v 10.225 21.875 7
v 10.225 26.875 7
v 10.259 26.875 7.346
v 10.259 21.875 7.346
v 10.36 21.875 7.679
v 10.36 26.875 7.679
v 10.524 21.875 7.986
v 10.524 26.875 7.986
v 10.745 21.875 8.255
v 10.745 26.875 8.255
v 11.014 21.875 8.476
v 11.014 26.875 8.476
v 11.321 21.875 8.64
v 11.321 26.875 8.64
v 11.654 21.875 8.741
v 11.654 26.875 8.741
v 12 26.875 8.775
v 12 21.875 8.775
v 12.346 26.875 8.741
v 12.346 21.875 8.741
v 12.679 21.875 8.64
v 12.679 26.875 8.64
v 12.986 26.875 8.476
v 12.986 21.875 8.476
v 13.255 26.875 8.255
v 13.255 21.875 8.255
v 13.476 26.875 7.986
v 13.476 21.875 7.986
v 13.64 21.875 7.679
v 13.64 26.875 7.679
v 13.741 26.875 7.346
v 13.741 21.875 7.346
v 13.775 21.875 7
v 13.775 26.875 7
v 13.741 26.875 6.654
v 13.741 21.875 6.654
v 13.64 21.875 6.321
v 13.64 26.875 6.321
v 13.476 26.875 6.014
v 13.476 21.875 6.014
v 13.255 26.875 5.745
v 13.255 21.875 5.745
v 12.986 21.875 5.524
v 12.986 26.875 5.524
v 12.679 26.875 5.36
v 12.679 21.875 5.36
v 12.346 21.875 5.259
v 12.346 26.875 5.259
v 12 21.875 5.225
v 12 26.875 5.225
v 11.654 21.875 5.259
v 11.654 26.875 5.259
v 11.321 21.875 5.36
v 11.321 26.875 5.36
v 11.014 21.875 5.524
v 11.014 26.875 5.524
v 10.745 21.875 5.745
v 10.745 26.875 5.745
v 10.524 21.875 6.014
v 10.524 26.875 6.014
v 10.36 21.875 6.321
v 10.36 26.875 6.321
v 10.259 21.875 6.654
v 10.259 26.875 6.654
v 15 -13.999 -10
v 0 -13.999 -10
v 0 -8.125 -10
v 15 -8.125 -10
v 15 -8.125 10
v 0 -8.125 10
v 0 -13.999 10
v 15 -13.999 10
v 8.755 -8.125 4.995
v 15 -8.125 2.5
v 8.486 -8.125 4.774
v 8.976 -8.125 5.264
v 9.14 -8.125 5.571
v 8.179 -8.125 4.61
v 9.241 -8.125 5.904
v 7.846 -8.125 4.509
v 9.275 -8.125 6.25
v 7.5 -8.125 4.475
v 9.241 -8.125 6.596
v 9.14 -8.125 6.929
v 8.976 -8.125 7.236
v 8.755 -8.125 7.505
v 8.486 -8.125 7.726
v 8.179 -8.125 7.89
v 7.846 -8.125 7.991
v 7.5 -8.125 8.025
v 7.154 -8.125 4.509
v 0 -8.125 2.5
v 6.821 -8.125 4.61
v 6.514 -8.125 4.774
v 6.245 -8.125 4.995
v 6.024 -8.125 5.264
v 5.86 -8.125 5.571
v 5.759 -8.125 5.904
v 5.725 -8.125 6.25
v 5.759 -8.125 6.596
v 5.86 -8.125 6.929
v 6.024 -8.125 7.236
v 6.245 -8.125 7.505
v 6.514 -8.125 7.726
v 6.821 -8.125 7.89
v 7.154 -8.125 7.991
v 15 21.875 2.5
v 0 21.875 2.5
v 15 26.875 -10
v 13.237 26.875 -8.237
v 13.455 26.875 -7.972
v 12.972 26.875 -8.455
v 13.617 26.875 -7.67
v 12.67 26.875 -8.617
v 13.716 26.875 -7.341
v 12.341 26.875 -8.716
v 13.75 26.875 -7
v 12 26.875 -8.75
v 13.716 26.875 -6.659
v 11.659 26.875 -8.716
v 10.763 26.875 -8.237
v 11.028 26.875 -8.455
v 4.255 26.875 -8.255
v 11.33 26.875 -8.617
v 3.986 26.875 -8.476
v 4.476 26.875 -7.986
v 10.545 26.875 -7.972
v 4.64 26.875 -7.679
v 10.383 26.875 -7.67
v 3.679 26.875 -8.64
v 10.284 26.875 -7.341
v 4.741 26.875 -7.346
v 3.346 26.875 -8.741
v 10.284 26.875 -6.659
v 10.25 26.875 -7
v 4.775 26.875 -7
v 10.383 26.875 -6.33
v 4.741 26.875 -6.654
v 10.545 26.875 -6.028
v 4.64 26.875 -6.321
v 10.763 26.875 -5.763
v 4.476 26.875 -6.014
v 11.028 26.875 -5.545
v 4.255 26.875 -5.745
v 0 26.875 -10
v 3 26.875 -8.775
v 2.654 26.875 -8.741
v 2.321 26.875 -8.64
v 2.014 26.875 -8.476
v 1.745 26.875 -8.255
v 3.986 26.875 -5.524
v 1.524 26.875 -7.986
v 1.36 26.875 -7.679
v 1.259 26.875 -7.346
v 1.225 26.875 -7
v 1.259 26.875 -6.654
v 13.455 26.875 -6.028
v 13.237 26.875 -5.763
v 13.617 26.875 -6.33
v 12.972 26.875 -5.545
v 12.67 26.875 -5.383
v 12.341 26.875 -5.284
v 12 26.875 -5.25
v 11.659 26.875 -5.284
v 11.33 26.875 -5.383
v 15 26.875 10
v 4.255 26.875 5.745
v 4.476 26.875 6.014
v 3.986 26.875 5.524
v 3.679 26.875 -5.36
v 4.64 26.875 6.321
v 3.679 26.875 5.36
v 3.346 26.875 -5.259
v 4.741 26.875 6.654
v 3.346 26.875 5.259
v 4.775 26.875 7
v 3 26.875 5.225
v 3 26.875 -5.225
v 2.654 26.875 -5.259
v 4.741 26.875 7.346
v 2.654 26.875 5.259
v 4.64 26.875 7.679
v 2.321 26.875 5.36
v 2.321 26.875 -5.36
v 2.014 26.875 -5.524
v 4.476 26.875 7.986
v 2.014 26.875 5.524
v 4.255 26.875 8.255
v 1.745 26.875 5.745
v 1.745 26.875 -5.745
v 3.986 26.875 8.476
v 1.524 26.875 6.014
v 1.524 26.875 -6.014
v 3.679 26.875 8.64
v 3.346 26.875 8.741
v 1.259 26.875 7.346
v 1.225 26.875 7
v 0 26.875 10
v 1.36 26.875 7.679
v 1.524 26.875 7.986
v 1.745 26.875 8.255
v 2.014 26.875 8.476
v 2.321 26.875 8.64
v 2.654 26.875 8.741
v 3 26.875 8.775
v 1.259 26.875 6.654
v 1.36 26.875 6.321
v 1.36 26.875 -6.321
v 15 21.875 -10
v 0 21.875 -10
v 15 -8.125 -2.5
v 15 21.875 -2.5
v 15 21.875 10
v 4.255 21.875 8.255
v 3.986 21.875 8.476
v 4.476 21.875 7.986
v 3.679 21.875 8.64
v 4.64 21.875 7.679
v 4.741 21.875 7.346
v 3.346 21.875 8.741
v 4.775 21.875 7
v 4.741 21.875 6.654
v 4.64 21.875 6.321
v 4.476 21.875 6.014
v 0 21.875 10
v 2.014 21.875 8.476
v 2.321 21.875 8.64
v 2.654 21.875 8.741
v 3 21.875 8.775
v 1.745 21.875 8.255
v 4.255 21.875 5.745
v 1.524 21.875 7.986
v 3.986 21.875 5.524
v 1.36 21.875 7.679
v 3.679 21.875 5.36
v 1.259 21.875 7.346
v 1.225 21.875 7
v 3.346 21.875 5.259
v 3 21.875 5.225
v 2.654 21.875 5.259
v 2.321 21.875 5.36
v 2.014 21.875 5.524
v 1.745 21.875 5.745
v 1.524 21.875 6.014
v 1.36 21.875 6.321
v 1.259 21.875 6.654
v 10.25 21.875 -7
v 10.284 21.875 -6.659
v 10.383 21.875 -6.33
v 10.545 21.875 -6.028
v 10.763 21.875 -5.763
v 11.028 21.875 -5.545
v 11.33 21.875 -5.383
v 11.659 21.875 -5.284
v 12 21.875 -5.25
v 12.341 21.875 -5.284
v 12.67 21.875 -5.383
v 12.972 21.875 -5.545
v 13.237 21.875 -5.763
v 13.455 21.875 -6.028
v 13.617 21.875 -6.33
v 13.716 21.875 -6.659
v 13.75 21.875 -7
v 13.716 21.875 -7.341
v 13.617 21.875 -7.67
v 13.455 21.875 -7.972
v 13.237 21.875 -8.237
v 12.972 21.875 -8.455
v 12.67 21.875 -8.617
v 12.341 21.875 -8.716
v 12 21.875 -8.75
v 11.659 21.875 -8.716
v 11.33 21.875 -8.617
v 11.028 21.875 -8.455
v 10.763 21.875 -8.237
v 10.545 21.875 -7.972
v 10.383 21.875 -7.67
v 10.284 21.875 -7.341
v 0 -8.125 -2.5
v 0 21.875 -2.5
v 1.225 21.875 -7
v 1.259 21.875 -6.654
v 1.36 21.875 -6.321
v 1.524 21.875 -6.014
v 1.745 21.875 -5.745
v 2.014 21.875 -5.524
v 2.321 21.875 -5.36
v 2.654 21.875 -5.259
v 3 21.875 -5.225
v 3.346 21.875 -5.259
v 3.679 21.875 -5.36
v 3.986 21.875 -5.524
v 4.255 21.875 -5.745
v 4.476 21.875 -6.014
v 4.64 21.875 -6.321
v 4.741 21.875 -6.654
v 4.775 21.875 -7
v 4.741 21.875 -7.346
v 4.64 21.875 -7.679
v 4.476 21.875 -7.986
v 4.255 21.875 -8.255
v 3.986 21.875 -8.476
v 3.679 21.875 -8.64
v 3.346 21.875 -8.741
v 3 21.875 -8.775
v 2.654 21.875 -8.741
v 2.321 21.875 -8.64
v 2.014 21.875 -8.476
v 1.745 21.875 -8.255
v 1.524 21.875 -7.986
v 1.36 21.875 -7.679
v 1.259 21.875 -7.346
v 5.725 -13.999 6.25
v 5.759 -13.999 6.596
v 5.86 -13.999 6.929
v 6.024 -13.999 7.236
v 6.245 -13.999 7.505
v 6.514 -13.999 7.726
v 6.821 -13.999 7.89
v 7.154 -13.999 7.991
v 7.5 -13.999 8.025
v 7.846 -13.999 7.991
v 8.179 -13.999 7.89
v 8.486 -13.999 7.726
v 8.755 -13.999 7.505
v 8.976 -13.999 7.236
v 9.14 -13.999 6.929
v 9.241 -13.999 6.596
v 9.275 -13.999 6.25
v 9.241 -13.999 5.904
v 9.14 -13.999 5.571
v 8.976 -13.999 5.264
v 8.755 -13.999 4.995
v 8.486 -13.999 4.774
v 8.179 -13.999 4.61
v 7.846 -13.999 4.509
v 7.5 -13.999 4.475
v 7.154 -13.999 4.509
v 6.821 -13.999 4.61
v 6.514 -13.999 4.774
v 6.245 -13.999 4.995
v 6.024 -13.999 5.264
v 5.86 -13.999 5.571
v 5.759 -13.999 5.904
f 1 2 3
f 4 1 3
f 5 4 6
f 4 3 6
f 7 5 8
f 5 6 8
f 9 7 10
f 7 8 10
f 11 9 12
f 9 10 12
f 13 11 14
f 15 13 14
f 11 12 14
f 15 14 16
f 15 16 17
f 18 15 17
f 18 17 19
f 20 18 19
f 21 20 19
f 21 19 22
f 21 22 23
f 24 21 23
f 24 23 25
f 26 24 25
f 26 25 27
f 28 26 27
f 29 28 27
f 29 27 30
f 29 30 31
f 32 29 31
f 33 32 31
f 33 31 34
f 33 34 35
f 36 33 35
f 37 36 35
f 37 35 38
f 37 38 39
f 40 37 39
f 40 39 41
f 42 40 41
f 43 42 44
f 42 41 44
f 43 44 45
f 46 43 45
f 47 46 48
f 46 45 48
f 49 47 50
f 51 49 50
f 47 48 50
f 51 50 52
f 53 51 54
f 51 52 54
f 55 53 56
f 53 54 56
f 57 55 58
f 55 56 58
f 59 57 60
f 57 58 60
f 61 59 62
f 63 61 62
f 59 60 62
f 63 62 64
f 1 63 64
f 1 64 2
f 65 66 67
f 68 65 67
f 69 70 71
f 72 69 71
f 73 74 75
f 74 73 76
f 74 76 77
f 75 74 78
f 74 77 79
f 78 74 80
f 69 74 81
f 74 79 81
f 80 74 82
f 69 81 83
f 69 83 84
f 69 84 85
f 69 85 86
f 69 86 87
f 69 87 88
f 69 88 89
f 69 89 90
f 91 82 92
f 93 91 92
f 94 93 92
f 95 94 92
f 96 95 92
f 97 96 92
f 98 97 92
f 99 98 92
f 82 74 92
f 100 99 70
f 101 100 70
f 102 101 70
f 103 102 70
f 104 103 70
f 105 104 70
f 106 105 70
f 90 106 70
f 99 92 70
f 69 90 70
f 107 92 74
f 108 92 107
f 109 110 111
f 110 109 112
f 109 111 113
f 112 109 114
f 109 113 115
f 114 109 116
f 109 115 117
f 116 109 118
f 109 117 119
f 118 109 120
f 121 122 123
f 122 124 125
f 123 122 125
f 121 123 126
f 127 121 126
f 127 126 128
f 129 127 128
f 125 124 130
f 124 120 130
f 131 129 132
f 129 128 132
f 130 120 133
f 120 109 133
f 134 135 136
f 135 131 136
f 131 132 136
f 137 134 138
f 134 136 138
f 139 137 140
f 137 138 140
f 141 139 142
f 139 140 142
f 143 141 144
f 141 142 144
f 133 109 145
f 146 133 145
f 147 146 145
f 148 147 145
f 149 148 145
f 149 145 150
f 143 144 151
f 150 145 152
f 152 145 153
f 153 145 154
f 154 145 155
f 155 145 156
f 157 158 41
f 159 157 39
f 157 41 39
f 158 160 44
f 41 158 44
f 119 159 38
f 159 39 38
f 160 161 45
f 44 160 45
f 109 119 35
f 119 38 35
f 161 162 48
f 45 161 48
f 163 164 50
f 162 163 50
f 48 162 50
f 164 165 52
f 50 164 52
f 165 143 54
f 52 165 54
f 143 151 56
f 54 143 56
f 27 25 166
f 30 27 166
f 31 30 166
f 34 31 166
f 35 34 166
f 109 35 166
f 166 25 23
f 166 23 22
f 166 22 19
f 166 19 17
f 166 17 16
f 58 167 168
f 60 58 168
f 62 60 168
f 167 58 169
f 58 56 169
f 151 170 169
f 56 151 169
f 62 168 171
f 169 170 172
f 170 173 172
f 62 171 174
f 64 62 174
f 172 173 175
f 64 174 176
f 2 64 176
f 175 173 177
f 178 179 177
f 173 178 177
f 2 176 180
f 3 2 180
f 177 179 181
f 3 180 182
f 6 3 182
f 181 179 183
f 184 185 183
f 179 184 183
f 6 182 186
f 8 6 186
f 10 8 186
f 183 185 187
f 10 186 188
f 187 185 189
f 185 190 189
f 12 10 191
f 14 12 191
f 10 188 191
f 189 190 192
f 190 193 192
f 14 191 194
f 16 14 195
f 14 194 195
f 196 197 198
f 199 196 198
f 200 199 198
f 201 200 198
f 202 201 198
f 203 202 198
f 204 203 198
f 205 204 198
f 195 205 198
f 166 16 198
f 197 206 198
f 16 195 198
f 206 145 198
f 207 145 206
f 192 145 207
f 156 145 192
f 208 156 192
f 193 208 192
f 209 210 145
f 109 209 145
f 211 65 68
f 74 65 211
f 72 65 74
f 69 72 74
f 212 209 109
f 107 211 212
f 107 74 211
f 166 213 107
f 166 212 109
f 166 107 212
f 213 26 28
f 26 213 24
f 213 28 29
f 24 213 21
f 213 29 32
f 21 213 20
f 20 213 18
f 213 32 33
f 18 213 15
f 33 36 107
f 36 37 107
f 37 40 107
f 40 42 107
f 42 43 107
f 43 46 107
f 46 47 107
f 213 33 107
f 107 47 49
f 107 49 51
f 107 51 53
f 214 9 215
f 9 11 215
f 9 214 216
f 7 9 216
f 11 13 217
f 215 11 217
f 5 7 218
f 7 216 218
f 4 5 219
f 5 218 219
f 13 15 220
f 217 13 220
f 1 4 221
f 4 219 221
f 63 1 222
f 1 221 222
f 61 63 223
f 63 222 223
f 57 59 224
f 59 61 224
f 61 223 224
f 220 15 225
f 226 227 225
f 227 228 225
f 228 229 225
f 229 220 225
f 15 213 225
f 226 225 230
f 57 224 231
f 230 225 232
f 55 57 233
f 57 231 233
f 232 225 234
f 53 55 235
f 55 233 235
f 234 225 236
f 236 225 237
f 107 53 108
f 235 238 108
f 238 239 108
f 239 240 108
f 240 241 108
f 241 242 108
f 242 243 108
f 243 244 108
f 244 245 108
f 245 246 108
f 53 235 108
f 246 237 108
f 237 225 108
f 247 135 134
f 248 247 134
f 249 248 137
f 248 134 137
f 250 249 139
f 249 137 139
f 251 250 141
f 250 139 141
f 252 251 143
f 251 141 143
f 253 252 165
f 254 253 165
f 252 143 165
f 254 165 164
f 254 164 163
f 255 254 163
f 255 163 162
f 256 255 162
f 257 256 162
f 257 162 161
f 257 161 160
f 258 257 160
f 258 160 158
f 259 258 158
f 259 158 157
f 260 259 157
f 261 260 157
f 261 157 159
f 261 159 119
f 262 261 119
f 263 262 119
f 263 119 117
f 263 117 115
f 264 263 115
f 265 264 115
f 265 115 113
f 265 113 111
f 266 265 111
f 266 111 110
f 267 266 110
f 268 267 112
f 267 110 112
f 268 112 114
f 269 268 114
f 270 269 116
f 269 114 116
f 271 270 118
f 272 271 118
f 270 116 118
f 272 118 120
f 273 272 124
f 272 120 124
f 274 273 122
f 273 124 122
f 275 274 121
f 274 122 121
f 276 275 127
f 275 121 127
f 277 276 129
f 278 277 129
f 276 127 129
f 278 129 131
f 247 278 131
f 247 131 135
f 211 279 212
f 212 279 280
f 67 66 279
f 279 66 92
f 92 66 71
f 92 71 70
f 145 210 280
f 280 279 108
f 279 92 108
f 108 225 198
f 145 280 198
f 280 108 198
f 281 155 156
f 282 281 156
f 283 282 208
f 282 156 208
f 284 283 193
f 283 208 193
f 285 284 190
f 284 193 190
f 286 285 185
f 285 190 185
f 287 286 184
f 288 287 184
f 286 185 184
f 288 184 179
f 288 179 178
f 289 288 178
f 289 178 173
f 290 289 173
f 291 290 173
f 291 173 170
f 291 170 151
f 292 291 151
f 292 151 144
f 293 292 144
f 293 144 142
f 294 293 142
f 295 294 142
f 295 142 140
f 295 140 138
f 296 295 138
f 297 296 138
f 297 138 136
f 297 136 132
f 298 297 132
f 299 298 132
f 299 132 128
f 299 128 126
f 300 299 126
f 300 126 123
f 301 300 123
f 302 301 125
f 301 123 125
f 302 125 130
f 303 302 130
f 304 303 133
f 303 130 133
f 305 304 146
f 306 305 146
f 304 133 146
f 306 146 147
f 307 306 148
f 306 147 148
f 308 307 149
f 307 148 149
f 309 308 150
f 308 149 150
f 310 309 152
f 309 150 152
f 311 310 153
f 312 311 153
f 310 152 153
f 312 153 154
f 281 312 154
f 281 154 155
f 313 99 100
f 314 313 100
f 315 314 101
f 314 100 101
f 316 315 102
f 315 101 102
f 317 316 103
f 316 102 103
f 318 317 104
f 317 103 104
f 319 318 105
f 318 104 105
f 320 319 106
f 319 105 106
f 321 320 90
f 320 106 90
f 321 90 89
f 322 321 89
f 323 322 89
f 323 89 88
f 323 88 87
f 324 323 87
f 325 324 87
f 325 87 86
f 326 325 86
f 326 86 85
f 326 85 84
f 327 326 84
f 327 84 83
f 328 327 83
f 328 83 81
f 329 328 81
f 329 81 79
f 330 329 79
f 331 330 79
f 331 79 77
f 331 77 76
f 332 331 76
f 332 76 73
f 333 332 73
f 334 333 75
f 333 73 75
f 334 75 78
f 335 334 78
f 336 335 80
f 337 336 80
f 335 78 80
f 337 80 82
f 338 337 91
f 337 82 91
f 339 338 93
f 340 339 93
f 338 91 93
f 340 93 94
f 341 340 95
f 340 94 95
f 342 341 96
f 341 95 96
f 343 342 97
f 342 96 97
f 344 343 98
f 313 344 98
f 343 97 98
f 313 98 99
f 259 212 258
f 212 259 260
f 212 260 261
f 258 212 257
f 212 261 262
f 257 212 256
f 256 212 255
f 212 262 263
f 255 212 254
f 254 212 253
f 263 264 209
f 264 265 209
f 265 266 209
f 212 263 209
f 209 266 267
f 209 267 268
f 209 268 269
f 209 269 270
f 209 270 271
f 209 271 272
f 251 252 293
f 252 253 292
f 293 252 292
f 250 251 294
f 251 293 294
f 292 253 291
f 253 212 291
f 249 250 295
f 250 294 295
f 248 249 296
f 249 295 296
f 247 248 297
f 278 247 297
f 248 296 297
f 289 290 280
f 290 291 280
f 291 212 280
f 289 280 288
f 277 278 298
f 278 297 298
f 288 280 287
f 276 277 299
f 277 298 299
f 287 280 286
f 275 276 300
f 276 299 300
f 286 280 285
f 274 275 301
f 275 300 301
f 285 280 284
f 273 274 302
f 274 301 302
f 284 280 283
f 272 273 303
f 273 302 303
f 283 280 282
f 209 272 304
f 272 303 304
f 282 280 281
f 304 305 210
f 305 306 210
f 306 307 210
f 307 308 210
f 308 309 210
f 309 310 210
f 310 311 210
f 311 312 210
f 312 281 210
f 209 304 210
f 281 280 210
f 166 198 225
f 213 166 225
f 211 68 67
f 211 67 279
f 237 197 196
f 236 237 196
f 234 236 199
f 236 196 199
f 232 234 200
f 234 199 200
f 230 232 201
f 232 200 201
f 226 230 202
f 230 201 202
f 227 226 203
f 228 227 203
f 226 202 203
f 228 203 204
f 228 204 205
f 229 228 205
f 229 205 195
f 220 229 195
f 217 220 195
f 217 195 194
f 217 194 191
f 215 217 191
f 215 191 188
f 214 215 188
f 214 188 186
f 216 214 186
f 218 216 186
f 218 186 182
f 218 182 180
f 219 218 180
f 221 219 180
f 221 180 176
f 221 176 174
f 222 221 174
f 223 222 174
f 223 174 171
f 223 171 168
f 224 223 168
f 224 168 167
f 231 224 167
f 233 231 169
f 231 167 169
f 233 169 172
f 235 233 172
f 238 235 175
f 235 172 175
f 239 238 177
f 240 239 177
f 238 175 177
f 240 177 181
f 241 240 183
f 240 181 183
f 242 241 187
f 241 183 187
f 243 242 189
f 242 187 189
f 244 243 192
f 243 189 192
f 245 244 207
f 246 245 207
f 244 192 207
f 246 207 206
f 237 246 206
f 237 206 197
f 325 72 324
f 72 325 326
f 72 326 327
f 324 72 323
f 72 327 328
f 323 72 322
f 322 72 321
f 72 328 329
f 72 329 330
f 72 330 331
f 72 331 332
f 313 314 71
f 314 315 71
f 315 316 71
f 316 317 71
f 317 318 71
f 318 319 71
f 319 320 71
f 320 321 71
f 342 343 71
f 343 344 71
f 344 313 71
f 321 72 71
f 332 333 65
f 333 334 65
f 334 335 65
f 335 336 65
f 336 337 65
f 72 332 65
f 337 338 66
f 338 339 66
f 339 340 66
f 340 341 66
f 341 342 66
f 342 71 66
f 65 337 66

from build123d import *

# Parameters (mm, degrees)
F0_W     = 30
F0_H     = 5
F1_DEPTH = 15
F3_R     = 1.775
F4_DEPTH = 25
F2_R     = 1.775
F2_R_2   = 1.75
F5_DEPTH = 25


with BuildPart() as f1:
    # F0 (on Right) → F1 (new body)
    with BuildSketch(Plane.YZ):
        Polygon((-8.125334, 10), (-13.998746, 10), (-13.998746, -10), (-8.125334, -10), (-8.125334, -2.5), (-8.125334, 2.5), align=None)
        with Locations((6.874666, 0)):
            Rectangle(F0_W, F0_H)
        Polygon((21.874666, 10), (21.874666, 2.5), (21.874666, -2.5), (21.874666, -10), (26.874666, -10), (26.874666, 10), align=None)
    extrude(amount=F1_DEPTH)

    # F3 (on face) → F4 (cut)
    with BuildSketch(Plane(origin=(0, -8.125334, 0), x_dir=(-1, 0, 0), z_dir=(0, 1, 0))):
        with Locations((-7.5, 6.25)):
            Circle(F3_R)
    extrude(amount=-F4_DEPTH, mode=Mode.SUBTRACT)

    # F2 (on face) → F5 (cut)
    with BuildSketch(Plane(origin=(0, 26.874666, 0), x_dir=(-1, 0, 0), z_dir=(0, 1, 0))):
        with Locations((-12, 7)):
            Circle(F2_R)
        with Locations((-3, 7)):
            Circle(F2_R)
        with Locations((-3, -7)):
            Circle(F2_R)
        with Locations((-12, -7)):
            Circle(F2_R_2)
    extrude(amount=-F5_DEPTH, mode=Mode.SUBTRACT)


solid = f1.part
